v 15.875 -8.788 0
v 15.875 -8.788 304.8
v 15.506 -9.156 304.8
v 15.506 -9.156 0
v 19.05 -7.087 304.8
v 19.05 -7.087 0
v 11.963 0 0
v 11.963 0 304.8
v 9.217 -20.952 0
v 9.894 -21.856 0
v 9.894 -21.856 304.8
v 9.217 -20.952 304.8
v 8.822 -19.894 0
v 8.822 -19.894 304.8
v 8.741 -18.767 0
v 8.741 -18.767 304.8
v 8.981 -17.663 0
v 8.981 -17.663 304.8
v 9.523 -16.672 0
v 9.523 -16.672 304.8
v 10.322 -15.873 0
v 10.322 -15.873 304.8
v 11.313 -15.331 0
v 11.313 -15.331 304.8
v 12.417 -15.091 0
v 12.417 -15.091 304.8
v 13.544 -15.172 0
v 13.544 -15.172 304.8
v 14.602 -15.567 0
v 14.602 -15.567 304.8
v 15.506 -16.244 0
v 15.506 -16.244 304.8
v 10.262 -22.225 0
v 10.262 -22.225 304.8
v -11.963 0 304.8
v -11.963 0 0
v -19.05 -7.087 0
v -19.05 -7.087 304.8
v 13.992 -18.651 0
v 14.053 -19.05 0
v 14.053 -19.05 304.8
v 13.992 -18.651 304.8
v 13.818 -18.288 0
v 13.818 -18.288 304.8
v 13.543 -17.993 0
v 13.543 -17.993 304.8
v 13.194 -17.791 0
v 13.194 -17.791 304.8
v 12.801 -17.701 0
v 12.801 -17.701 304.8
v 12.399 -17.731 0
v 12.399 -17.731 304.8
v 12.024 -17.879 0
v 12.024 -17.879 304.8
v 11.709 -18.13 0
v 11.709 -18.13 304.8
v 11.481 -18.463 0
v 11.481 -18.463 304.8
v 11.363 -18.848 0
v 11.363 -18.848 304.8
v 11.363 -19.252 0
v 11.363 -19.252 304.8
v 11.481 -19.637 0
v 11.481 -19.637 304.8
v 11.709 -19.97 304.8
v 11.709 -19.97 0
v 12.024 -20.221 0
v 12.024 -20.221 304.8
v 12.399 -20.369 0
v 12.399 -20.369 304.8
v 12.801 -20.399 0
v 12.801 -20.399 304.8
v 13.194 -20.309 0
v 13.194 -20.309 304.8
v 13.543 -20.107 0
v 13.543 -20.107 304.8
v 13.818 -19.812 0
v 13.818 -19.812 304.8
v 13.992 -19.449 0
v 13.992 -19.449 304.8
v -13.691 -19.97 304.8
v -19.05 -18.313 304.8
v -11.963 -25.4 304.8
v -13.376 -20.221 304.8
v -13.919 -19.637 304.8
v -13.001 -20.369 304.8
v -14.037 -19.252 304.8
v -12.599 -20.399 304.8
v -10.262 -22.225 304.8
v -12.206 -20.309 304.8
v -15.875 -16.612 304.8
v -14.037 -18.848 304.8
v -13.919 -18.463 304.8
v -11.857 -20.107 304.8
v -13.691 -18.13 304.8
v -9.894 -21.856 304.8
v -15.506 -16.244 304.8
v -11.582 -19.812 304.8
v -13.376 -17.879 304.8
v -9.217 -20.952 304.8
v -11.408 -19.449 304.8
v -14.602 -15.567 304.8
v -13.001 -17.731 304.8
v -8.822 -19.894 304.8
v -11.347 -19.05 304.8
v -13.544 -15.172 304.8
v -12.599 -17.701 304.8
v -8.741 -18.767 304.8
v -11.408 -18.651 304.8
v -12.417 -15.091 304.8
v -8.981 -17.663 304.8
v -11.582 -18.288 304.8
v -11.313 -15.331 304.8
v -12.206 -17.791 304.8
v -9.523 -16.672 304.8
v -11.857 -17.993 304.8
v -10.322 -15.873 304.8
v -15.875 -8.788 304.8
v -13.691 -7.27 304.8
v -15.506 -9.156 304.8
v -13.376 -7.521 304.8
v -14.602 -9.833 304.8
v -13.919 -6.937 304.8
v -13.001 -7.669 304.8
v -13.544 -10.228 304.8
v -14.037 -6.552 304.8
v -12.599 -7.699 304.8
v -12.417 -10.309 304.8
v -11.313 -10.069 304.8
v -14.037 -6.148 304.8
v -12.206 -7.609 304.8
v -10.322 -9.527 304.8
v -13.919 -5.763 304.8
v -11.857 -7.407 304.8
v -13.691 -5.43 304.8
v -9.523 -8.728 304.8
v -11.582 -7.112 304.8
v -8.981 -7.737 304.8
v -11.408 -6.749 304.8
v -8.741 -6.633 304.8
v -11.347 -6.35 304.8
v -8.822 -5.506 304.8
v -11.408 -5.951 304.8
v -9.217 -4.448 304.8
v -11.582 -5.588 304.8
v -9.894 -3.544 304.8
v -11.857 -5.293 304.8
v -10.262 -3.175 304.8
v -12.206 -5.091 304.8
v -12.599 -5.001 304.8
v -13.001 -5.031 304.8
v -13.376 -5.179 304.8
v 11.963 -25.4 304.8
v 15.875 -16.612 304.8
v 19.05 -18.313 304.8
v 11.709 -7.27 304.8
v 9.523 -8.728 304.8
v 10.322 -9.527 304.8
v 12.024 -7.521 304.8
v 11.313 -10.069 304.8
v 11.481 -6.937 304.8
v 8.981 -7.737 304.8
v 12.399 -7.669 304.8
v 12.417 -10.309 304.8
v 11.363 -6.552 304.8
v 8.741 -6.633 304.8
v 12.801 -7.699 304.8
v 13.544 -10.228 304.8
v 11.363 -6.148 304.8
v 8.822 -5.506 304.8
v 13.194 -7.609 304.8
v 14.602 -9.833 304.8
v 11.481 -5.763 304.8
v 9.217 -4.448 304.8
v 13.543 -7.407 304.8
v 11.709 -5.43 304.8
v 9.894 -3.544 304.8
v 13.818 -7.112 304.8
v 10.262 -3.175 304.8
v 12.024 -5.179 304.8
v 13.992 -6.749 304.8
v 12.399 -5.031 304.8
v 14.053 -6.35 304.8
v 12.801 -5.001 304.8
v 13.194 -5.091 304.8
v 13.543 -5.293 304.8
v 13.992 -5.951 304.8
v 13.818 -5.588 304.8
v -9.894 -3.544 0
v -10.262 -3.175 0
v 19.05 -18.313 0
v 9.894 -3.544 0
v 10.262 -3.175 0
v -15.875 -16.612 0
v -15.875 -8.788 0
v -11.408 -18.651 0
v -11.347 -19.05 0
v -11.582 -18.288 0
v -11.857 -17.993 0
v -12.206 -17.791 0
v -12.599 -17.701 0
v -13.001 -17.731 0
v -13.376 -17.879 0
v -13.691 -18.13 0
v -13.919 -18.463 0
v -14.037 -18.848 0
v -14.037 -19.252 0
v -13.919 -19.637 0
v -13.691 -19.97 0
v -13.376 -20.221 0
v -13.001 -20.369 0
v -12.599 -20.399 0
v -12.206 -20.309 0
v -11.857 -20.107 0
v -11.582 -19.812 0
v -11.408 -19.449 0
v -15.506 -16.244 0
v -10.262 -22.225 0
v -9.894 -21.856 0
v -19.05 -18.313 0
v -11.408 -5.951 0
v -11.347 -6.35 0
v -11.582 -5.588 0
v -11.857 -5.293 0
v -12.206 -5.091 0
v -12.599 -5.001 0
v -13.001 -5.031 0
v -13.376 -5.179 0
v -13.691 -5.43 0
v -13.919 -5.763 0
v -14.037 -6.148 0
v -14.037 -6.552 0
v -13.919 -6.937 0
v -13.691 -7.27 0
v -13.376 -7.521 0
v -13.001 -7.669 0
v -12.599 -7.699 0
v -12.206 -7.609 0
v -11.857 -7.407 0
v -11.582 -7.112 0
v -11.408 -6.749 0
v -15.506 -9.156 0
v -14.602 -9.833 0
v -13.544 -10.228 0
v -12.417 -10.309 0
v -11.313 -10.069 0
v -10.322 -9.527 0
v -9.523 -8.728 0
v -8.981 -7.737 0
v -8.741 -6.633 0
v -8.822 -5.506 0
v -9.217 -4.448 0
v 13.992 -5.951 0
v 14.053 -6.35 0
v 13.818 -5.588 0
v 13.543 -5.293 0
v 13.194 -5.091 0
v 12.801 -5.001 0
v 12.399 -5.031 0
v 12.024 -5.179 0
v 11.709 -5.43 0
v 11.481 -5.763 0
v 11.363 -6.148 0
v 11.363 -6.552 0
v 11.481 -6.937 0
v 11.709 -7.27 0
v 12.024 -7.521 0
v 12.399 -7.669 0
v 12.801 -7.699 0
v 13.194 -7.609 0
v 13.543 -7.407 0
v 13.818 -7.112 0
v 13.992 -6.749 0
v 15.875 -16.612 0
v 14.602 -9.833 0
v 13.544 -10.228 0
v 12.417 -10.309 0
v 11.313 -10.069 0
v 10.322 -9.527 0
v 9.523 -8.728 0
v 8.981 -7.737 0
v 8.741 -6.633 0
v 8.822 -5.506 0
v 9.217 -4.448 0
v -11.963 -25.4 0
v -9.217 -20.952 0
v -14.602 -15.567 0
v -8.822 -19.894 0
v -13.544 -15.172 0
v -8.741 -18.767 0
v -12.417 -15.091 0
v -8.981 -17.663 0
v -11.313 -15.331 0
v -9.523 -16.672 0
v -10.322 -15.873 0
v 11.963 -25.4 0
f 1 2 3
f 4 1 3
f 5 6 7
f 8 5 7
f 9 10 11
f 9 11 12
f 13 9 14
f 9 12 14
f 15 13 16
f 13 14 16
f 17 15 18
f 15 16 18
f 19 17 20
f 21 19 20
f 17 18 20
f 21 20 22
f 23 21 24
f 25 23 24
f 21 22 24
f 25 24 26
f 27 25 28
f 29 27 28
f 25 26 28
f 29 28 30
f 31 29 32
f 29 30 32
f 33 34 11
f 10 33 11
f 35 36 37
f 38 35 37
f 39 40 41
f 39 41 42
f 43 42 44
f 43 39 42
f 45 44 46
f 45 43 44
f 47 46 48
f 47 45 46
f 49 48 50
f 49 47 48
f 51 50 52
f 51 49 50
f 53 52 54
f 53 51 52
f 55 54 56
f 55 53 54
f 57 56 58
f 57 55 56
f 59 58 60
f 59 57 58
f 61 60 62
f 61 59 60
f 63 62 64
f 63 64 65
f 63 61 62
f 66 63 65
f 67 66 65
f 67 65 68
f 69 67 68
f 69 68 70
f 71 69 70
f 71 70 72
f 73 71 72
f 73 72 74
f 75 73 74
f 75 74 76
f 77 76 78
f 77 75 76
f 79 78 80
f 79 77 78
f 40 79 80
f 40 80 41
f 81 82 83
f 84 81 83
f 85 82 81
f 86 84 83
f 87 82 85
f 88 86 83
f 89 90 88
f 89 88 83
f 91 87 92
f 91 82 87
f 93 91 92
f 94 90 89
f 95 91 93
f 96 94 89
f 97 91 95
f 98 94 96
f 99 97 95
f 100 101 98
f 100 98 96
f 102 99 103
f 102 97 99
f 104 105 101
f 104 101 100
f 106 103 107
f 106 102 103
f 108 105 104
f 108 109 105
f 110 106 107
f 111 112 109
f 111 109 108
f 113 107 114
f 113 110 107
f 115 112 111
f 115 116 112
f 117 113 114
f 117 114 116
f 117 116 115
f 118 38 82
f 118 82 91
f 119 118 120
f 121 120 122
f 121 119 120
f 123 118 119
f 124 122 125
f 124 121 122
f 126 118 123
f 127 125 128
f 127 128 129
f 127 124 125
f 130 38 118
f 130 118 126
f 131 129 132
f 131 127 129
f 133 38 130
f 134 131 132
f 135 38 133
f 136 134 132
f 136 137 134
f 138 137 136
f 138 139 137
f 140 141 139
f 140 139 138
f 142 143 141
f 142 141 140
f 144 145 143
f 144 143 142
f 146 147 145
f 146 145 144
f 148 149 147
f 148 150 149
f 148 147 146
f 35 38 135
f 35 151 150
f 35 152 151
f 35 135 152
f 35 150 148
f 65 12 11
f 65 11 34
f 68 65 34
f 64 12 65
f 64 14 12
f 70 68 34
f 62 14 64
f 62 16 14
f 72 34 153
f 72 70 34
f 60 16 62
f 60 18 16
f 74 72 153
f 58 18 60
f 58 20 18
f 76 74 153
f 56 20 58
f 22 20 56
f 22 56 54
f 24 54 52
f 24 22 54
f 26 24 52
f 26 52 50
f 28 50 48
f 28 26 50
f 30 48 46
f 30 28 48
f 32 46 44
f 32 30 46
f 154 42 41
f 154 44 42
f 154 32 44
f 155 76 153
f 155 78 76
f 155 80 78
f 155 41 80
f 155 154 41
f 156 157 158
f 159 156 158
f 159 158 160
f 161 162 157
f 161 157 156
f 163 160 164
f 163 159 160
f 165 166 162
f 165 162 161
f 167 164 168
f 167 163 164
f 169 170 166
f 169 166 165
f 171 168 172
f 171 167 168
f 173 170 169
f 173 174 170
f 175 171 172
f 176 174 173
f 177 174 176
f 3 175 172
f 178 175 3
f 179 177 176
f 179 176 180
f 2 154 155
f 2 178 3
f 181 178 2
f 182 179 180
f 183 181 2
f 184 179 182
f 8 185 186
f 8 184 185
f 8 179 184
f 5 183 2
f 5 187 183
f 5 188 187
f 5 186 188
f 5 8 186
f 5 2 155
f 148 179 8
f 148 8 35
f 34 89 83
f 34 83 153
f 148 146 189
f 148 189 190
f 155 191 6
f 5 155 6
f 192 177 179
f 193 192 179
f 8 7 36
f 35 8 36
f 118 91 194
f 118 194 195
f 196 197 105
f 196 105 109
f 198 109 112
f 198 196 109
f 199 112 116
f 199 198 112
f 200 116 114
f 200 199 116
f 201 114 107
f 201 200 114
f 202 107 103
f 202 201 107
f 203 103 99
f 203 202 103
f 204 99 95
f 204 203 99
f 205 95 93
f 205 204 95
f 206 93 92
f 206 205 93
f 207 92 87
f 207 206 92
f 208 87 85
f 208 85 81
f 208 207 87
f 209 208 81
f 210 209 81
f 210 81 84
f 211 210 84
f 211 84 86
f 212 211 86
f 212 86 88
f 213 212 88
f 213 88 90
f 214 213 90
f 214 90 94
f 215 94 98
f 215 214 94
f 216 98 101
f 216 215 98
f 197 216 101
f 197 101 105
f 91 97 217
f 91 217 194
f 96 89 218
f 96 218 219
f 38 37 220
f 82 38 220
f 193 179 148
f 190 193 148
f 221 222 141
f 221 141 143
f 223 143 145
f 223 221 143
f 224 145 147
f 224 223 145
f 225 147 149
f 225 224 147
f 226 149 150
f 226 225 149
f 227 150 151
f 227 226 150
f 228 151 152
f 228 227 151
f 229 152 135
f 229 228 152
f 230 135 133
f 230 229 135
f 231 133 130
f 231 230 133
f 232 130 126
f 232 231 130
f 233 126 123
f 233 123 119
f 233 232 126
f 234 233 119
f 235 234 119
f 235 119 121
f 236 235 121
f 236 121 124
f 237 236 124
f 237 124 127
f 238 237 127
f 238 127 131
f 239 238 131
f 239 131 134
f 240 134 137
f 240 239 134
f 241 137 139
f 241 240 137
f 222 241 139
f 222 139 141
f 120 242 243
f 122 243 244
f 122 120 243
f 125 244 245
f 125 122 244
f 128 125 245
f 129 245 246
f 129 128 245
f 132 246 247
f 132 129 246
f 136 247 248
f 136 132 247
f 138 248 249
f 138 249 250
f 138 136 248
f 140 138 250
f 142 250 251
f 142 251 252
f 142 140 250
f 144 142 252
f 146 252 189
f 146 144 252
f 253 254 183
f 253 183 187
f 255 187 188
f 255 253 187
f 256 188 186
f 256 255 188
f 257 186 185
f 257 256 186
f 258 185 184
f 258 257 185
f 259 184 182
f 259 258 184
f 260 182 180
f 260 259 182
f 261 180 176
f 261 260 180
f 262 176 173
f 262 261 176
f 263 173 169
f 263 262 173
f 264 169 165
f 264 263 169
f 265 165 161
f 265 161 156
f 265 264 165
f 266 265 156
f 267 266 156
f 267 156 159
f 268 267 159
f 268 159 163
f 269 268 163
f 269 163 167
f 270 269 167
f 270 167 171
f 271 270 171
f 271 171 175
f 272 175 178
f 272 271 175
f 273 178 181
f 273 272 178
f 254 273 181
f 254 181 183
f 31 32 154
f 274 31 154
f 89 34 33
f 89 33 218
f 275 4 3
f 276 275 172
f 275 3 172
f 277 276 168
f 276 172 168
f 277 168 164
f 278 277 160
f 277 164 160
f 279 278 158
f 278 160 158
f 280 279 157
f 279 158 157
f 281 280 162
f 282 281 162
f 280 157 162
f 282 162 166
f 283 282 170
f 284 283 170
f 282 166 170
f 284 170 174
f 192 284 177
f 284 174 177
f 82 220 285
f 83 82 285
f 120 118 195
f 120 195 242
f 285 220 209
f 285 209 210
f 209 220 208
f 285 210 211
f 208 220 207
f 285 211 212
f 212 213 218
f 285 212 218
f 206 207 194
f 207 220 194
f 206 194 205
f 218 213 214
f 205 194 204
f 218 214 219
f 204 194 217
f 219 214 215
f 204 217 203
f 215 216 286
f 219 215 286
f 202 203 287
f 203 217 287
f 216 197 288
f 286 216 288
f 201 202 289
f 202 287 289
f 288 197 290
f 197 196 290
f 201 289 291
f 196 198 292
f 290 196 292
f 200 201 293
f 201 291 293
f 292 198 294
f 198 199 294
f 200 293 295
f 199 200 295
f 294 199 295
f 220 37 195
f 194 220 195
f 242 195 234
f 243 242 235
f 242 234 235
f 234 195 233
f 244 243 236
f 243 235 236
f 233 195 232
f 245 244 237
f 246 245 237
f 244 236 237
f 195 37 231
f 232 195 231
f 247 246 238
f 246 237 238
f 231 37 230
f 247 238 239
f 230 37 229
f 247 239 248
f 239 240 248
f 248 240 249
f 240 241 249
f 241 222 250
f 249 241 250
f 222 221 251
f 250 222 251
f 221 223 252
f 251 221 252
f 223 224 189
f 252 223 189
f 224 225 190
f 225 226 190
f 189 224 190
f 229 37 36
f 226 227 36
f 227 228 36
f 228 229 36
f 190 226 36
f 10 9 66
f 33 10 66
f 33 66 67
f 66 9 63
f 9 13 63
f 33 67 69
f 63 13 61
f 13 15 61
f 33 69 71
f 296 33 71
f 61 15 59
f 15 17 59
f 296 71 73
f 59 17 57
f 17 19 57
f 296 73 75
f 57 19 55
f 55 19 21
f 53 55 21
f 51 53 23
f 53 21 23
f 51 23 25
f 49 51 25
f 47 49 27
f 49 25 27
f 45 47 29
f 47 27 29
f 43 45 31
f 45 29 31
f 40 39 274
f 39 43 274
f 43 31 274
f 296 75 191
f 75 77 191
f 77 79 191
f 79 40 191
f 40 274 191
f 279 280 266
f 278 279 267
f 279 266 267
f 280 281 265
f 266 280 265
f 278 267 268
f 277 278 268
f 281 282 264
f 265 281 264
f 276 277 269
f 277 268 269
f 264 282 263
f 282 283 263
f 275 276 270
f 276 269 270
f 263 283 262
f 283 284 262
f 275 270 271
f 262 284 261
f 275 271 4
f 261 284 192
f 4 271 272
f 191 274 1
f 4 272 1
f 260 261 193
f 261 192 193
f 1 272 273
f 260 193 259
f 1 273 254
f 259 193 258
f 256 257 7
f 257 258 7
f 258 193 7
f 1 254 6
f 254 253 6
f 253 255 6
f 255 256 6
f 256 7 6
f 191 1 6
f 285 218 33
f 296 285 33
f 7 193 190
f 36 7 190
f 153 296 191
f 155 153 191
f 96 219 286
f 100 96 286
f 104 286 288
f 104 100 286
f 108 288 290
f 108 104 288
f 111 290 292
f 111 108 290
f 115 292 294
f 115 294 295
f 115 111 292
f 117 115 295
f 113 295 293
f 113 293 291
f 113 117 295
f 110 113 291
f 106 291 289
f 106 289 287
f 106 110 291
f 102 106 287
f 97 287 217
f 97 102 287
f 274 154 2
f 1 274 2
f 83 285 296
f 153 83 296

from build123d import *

# Parameters (mm, degrees)
F0_R     = 1.35255
F1_DEPTH = 304.8
F2_T     = 3.175
F3_DEPTH = 3.175
F5_DEPTH = 304.8


# Not quite as in the source:
# - a pattern or mirror of a feature is missing from the dataset's text; its kind, count and spacing are read off the source's solid
# - a shell that OpenCascade refuses in one call is made with other operations: the cavity is built on its own and cut out


with BuildPart() as f1:
    # F0 (on Top) → F1 (new body)
    with BuildSketch(Plane.XY):
        Polygon((11.9626600757, 0), (-11.9626600757, 0), (-19.05, -7.0873399243), (-19.05, -18.3126600757), (-11.9626600757, -25.4), (11.9626600757, -25.4), (19.05, -18.3126600757), (19.05, -7.0873399243), align=None)
        with Locations((-12.7, -19.05)):
            Circle(F0_R, mode=Mode.SUBTRACT)
        with Locations((12.7, -19.05)):
            Circle(F0_R, mode=Mode.SUBTRACT)
        with Locations((-12.7, -6.35)):
            Circle(F0_R, mode=Mode.SUBTRACT)
        with Locations((12.7, -6.35)):
            Circle(F0_R, mode=Mode.SUBTRACT)
    extrude(amount=F1_DEPTH)

    # F2: shell of thickness 3.175, made by hand


with BuildPart() as f2_core1:
    # F2_t2: copy of F1
    add(f1.part)

    # the walls: a layer under each face that stays
    f2_faces = [f2_core1.faces().sort_by_distance(p)[0] for p in [
        (0, 0, 152.4),
        (-15.5063300378, -3.5436699622, 152.4),
        (-19.05, -12.7, 152.4),
        (-15.5063300378, -21.8563300378, 152.4),
        (0, -25.4, 152.4),
        (15.5063300378, -21.8563300378, 152.4),
        (19.05, -12.7, 152.4),
        (15.5063300378, -3.5436699622, 152.4),
        (-14.05255, -19.05, 152.4),
        (11.34745, -19.05, 152.4),
        (-14.05255, -6.35, 152.4),
        (11.34745, -6.35, 152.4),
        (0, -12.7, 0),
    ]]
    thicken(f2_faces, amount=-F2_T, mode=Mode.SUBTRACT)


with BuildPart() as f1_1:
    add(f1.part)

    # what is left inside the walls is the cavity
    f2_cavity = [f2_core1.part.solids().sort_by_distance(p)[0] for p in [
        (0, -3.20675, 204.258333),
    ]]
    add(f2_cavity, mode=Mode.SUBTRACT)

    # F3 (cut, through all): a face of the model
    f3_faces = [f1_1.faces().sort_by_distance(p)[0] for p in [
        (0, -12.7, 3.175),
    ]]
    extrude(f3_faces, amount=-F3_DEPTH, mode=Mode.SUBTRACT)

    # F4 (on face) → F5 (cut, through all)
    with BuildSketch(Plane.XY.offset(304.8)):
        with BuildLine():
            ThreePointArc((15.5063300378, -9.1563300378), (9.8936699622, -9.1563300378), (9.8936699622, -3.5436699622))
            Line((9.8936699622, -3.5436699622), (10.2623399243, -3.175))
            Line((10.2623399243, -3.175), (9.4722943129, -3.175))
            ThreePointArc((9.4722943129, -3.175), (9.4985386928, -9.5514613072), (15.875, -9.5777056871))
            Line((15.875, -9.5777056871), (15.875, -8.7876600757))
            Line((15.875, -8.7876600757), (15.5063300378, -9.1563300378))
        make_face()
        with BuildLine():
            Line((15.875, -16.6123399243), (15.875, -15.8222943129))
            ThreePointArc((15.875, -15.8222943129), (9.4985386928, -15.8485386928), (9.4722943129, -22.225))
            Line((9.4722943129, -22.225), (10.2623399243, -22.225))
            Line((10.2623399243, -22.225), (9.8936699622, -21.8563300378))
            ThreePointArc((9.8936699622, -21.8563300378), (9.8936699622, -16.2436699622), (15.5063300378, -16.2436699622))
            Line((15.5063300378, -16.2436699622), (15.875, -16.6123399243))
        make_face()
    f5 = extrude(amount=-F5_DEPTH, mode=Mode.SUBTRACT)

    # F5_copies: F5 across plane
    add(f5.mirror(Plane(origin=(0, 0, 0), x_dir=(0, 0, -1), z_dir=(-1, 0, 0))), mode=Mode.SUBTRACT)


solid = f1_1.part
